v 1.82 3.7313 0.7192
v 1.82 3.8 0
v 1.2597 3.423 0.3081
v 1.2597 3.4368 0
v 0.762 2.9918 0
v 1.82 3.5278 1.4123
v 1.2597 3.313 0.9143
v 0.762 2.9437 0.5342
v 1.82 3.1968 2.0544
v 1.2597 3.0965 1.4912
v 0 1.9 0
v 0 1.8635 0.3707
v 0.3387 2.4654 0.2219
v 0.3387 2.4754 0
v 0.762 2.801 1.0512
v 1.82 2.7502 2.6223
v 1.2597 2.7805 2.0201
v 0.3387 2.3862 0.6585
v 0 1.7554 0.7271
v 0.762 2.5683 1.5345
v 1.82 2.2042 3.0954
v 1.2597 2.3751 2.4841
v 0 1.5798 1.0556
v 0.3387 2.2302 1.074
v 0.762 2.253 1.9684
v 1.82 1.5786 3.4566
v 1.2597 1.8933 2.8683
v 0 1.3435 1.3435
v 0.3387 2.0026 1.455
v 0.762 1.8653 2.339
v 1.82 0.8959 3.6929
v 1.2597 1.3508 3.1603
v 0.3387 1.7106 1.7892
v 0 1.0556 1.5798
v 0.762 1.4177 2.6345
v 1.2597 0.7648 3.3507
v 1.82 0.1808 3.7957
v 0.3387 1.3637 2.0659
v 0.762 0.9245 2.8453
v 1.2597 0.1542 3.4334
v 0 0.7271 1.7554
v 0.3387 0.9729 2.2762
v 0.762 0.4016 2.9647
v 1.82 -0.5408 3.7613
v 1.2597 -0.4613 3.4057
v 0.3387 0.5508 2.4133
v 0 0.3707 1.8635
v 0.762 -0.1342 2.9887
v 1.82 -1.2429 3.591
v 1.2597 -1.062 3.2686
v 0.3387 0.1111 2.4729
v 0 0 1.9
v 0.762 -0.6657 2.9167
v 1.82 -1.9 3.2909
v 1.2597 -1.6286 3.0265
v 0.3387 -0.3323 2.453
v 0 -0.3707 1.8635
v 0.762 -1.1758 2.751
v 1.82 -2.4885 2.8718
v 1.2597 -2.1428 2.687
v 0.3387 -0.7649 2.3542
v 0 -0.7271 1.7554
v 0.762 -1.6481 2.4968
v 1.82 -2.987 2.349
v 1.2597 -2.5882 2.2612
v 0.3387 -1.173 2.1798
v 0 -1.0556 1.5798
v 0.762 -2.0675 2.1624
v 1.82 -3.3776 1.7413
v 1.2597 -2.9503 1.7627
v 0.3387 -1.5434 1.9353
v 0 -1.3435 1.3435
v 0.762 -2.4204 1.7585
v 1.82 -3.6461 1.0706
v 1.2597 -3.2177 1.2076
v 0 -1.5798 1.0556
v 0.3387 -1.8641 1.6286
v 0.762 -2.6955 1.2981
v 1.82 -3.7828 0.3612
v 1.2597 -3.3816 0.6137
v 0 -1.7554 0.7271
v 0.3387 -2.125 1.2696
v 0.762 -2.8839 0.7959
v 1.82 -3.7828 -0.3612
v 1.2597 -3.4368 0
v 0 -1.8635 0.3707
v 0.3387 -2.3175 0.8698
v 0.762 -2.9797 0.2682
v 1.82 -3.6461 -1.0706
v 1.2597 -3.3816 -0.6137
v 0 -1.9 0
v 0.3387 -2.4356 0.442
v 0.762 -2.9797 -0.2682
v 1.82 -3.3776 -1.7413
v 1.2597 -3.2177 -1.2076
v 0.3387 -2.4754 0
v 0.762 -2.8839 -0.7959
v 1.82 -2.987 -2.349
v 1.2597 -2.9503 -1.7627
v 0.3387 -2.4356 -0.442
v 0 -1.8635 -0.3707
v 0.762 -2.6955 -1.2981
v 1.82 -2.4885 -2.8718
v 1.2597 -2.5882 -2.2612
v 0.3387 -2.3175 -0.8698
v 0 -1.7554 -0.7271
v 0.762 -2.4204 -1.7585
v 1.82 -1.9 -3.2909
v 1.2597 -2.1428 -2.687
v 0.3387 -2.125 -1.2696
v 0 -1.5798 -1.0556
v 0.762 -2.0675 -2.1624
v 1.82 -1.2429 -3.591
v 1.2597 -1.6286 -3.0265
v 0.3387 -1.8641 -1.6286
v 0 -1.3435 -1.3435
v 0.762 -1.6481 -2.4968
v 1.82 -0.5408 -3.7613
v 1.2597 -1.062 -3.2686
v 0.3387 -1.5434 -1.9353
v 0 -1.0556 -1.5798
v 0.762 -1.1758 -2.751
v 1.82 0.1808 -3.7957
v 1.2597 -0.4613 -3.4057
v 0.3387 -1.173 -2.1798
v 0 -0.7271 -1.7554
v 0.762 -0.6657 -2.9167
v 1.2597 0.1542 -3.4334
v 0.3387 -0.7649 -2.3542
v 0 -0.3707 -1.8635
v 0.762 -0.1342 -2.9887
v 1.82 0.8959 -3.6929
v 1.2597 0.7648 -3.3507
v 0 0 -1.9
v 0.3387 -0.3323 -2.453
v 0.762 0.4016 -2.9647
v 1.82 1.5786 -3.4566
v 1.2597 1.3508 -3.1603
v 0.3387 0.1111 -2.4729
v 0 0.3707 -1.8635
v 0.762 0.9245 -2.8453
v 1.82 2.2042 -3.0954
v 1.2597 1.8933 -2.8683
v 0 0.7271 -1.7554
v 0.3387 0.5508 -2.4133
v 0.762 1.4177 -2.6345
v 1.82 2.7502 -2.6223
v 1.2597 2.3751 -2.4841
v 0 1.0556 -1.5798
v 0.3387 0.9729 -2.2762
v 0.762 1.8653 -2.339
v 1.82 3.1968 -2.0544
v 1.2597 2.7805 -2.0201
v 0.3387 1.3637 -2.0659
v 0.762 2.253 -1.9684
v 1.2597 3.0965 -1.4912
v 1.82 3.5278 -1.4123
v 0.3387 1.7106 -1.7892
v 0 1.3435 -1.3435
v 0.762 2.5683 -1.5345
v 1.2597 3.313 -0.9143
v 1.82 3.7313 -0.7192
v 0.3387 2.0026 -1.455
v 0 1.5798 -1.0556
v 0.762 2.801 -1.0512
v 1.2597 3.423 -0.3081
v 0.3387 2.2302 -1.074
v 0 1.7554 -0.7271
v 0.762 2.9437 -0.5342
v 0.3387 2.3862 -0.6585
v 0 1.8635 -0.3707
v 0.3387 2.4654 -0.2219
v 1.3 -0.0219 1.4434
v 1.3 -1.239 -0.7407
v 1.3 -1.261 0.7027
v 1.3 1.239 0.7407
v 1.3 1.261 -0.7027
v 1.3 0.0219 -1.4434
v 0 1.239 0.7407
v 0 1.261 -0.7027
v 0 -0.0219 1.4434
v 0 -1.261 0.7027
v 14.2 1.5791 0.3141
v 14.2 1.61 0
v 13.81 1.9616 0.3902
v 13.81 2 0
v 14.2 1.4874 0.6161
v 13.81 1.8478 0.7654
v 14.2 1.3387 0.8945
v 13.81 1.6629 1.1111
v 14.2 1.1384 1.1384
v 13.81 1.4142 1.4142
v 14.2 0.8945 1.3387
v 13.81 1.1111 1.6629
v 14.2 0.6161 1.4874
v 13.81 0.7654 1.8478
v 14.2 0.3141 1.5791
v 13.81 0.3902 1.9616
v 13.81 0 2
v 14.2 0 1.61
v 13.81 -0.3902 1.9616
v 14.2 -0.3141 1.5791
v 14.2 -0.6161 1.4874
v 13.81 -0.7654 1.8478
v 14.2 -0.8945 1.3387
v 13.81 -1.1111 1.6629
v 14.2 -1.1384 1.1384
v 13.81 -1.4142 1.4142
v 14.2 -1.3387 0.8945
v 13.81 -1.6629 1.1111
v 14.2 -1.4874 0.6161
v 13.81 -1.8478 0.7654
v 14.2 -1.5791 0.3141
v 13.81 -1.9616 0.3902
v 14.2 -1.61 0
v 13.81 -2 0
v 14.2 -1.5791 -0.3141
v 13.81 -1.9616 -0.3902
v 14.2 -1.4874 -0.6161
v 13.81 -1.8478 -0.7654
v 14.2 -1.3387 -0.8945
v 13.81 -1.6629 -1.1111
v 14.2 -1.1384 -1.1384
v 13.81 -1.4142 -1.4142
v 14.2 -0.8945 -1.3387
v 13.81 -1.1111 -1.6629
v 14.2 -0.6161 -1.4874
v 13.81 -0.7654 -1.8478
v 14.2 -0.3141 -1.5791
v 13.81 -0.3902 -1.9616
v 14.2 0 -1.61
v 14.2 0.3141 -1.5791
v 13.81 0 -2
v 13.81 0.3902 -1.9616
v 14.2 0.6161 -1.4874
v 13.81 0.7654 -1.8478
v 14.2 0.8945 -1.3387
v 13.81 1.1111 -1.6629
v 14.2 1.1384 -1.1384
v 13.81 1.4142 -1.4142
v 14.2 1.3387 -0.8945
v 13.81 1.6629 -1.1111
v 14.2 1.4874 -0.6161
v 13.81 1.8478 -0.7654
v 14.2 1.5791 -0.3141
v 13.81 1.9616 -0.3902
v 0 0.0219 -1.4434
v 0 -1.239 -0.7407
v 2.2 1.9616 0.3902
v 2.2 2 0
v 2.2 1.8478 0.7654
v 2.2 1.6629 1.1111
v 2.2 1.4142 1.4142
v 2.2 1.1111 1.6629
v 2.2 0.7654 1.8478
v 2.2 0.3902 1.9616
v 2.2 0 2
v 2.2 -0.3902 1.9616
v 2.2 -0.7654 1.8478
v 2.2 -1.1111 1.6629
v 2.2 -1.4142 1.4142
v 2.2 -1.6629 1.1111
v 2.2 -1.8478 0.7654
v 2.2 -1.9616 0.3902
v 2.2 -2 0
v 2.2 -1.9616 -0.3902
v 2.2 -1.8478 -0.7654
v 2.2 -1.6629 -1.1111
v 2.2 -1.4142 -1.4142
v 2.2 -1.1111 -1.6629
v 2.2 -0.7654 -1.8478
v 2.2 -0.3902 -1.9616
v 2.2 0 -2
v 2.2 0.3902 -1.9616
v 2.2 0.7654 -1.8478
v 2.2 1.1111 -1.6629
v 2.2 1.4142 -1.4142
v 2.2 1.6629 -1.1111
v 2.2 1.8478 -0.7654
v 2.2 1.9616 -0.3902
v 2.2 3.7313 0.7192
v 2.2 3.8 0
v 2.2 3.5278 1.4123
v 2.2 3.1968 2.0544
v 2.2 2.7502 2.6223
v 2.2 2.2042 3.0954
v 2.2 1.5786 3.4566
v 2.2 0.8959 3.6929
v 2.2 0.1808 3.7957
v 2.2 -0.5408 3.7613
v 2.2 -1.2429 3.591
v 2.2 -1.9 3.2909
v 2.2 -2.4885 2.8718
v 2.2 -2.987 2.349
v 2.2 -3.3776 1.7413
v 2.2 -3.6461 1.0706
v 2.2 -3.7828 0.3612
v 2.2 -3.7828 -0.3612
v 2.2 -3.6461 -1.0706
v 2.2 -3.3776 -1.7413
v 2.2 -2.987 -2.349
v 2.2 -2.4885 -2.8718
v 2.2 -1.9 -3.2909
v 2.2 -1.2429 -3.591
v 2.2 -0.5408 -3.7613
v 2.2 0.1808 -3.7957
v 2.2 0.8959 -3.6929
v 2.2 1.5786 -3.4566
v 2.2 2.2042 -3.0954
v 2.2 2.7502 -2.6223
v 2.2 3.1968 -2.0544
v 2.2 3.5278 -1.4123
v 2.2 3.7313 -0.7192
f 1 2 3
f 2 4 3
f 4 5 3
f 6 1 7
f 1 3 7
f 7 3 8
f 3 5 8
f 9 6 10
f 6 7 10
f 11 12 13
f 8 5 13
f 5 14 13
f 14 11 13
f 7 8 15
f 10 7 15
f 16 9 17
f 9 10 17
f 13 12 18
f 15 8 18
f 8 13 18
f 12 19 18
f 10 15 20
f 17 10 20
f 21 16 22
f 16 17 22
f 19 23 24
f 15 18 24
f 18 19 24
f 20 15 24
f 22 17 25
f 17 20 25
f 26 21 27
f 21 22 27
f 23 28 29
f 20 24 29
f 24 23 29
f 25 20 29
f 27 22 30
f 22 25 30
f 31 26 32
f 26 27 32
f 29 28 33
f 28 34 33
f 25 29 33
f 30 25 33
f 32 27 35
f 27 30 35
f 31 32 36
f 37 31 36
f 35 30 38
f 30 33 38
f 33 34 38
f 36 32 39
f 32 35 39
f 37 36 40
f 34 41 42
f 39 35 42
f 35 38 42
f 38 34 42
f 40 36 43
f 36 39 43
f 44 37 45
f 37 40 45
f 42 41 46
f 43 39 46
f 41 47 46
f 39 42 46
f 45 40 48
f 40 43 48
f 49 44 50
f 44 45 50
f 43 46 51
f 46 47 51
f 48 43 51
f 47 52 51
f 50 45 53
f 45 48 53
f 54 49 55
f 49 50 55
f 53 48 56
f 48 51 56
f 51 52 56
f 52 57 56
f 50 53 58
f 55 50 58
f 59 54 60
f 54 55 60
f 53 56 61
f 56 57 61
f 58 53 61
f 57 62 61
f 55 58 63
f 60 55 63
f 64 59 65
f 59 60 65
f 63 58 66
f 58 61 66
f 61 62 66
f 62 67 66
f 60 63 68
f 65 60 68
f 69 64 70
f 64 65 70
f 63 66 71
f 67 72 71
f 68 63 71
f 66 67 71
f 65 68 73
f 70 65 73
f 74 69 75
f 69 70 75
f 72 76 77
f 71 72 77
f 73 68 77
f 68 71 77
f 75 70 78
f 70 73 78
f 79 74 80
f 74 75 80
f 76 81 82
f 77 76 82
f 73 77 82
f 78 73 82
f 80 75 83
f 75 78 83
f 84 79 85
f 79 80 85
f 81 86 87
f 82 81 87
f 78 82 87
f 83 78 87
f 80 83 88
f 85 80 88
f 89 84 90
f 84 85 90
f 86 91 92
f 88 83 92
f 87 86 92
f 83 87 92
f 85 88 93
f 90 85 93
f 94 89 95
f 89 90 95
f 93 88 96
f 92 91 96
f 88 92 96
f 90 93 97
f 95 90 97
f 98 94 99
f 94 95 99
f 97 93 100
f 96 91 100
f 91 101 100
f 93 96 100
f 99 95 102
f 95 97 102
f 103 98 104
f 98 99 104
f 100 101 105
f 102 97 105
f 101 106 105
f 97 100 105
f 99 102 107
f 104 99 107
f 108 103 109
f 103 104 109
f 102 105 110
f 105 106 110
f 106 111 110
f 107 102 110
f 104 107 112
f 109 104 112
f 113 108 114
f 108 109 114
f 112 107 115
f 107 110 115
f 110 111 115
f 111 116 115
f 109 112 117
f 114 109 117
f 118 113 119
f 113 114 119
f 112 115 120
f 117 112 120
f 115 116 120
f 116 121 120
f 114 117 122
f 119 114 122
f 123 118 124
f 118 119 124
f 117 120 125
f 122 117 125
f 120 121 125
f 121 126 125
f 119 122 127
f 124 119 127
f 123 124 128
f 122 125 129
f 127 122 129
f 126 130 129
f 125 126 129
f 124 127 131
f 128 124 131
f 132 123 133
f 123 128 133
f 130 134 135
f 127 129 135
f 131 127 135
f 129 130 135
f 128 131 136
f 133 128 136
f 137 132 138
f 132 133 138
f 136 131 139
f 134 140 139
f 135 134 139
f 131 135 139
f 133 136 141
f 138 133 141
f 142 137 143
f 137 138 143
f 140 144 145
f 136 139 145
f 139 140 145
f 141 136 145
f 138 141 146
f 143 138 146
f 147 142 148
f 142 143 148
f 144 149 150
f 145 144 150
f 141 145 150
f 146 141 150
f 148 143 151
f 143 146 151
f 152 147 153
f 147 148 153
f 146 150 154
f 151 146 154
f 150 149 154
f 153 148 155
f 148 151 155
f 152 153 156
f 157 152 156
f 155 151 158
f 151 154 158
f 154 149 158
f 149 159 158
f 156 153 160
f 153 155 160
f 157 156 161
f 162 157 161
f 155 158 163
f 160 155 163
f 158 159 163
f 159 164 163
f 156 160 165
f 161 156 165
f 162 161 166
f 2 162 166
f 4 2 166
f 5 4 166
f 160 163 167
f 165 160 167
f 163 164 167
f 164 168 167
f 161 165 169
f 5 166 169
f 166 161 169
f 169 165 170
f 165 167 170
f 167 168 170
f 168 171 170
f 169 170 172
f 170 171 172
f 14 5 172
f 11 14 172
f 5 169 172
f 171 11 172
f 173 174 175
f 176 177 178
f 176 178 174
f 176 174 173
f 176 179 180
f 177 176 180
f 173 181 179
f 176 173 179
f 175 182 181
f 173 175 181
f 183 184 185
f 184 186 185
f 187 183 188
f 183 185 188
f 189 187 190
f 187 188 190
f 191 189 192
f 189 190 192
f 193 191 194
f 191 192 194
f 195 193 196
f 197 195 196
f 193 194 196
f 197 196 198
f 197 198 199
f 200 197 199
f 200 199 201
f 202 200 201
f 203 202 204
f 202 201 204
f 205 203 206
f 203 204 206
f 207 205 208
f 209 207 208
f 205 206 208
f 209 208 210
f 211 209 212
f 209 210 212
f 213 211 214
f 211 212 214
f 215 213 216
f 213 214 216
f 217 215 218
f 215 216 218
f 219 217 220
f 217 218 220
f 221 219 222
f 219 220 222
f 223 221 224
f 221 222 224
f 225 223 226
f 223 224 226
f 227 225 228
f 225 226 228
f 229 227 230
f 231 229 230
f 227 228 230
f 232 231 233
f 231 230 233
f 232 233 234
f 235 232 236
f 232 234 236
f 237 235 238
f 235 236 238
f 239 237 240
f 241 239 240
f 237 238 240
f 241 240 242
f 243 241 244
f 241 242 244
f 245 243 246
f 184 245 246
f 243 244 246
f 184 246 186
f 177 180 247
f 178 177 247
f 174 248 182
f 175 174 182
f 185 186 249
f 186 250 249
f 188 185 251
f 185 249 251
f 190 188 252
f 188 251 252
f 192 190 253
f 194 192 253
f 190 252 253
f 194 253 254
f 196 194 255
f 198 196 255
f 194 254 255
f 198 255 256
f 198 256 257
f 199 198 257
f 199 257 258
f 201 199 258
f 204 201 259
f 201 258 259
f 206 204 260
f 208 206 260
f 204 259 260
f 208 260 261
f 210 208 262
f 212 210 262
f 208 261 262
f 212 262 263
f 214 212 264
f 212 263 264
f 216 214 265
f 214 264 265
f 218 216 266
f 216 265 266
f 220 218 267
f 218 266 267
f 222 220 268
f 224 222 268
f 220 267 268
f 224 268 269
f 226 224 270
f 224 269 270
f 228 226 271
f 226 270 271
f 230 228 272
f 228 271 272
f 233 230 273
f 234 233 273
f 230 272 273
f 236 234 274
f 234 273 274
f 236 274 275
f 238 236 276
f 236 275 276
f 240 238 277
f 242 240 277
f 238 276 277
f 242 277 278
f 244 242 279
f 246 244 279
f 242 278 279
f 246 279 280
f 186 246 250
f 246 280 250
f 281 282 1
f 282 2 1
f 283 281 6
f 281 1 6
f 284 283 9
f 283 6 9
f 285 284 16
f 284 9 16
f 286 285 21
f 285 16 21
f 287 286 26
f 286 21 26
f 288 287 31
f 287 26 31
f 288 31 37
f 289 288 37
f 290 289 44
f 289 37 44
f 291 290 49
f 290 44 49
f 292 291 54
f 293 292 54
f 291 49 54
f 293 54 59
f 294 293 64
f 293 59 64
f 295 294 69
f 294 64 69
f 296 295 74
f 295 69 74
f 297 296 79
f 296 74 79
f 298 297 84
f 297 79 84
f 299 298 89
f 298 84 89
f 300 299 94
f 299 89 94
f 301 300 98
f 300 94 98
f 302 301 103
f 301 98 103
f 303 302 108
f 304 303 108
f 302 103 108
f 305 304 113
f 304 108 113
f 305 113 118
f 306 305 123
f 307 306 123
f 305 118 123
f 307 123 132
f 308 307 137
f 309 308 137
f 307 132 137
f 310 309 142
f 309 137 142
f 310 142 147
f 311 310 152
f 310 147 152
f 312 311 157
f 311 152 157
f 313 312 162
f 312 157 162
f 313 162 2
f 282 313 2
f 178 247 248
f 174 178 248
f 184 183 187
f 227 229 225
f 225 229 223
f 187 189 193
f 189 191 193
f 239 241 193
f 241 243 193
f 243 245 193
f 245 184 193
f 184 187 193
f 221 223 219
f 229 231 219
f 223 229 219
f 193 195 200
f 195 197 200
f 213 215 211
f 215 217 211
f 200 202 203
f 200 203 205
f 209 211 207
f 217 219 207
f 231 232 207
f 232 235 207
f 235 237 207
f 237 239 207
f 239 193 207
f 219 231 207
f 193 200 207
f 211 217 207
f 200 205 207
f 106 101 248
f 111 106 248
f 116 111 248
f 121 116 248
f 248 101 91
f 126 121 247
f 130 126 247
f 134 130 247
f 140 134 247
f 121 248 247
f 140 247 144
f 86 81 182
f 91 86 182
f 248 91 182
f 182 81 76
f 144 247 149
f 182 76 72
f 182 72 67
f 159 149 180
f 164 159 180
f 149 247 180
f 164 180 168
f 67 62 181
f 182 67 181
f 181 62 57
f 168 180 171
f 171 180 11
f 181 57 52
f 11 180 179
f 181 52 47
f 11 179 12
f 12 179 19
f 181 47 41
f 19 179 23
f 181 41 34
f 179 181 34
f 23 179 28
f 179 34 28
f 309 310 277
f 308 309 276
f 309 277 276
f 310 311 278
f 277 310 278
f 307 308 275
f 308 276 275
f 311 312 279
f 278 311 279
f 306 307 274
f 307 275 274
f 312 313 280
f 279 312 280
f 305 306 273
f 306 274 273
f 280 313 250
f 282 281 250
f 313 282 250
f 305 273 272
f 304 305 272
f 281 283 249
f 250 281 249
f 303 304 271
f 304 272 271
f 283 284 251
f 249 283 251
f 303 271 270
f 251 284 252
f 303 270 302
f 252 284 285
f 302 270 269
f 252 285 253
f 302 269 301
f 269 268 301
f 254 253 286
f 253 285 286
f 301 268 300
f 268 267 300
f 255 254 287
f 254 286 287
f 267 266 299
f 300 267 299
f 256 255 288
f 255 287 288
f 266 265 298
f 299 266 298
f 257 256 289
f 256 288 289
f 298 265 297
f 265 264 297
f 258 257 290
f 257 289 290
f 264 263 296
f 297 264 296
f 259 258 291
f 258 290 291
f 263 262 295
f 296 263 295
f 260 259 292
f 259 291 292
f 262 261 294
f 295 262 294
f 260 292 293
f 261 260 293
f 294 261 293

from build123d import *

# Parameters (mm, degrees)
CUT_EXTRUDE1_DEPTH = 1.3


with BuildPart() as part:
    # Sketch1 → Revolve1 (revolve)
    with BuildSketch(Plane.XY):
        with BuildLine():
            Line((14.2, 0), (14.2, 1.61))
            Line((14.2, 1.61), (13.81, 2))
            Line((13.81, 2), (2.2, 2))
            Line((2.2, 2), (2.2, 3.8))
            Line((2.2, 3.8), (1.82, 3.8))
            ThreePointArc((1.82, 3.8), (0.762013659, 2.991755338), (0, 1.9))
            Line((0, 1.9), (0, 0))
            Line((0, 0), (14.2, 0))
        make_face()
    revolve(axis=Axis((-2.02471666, 0, 0), (1, 0, 0)))

    # Sketch2 → Cut-Extrude1 (cut)
    with BuildSketch(Plane.ZY):
        Polygon((0.702687556, -1.260969814), (1.44337567, -0.021939633), (0.740688114, 1.239030181), (-0.702687556, 1.260969814), (-1.44337567, 0.021939633), (-0.740688114, -1.239030181), align=None)
    extrude(amount=-CUT_EXTRUDE1_DEPTH, mode=Mode.SUBTRACT)


solid = part.part
